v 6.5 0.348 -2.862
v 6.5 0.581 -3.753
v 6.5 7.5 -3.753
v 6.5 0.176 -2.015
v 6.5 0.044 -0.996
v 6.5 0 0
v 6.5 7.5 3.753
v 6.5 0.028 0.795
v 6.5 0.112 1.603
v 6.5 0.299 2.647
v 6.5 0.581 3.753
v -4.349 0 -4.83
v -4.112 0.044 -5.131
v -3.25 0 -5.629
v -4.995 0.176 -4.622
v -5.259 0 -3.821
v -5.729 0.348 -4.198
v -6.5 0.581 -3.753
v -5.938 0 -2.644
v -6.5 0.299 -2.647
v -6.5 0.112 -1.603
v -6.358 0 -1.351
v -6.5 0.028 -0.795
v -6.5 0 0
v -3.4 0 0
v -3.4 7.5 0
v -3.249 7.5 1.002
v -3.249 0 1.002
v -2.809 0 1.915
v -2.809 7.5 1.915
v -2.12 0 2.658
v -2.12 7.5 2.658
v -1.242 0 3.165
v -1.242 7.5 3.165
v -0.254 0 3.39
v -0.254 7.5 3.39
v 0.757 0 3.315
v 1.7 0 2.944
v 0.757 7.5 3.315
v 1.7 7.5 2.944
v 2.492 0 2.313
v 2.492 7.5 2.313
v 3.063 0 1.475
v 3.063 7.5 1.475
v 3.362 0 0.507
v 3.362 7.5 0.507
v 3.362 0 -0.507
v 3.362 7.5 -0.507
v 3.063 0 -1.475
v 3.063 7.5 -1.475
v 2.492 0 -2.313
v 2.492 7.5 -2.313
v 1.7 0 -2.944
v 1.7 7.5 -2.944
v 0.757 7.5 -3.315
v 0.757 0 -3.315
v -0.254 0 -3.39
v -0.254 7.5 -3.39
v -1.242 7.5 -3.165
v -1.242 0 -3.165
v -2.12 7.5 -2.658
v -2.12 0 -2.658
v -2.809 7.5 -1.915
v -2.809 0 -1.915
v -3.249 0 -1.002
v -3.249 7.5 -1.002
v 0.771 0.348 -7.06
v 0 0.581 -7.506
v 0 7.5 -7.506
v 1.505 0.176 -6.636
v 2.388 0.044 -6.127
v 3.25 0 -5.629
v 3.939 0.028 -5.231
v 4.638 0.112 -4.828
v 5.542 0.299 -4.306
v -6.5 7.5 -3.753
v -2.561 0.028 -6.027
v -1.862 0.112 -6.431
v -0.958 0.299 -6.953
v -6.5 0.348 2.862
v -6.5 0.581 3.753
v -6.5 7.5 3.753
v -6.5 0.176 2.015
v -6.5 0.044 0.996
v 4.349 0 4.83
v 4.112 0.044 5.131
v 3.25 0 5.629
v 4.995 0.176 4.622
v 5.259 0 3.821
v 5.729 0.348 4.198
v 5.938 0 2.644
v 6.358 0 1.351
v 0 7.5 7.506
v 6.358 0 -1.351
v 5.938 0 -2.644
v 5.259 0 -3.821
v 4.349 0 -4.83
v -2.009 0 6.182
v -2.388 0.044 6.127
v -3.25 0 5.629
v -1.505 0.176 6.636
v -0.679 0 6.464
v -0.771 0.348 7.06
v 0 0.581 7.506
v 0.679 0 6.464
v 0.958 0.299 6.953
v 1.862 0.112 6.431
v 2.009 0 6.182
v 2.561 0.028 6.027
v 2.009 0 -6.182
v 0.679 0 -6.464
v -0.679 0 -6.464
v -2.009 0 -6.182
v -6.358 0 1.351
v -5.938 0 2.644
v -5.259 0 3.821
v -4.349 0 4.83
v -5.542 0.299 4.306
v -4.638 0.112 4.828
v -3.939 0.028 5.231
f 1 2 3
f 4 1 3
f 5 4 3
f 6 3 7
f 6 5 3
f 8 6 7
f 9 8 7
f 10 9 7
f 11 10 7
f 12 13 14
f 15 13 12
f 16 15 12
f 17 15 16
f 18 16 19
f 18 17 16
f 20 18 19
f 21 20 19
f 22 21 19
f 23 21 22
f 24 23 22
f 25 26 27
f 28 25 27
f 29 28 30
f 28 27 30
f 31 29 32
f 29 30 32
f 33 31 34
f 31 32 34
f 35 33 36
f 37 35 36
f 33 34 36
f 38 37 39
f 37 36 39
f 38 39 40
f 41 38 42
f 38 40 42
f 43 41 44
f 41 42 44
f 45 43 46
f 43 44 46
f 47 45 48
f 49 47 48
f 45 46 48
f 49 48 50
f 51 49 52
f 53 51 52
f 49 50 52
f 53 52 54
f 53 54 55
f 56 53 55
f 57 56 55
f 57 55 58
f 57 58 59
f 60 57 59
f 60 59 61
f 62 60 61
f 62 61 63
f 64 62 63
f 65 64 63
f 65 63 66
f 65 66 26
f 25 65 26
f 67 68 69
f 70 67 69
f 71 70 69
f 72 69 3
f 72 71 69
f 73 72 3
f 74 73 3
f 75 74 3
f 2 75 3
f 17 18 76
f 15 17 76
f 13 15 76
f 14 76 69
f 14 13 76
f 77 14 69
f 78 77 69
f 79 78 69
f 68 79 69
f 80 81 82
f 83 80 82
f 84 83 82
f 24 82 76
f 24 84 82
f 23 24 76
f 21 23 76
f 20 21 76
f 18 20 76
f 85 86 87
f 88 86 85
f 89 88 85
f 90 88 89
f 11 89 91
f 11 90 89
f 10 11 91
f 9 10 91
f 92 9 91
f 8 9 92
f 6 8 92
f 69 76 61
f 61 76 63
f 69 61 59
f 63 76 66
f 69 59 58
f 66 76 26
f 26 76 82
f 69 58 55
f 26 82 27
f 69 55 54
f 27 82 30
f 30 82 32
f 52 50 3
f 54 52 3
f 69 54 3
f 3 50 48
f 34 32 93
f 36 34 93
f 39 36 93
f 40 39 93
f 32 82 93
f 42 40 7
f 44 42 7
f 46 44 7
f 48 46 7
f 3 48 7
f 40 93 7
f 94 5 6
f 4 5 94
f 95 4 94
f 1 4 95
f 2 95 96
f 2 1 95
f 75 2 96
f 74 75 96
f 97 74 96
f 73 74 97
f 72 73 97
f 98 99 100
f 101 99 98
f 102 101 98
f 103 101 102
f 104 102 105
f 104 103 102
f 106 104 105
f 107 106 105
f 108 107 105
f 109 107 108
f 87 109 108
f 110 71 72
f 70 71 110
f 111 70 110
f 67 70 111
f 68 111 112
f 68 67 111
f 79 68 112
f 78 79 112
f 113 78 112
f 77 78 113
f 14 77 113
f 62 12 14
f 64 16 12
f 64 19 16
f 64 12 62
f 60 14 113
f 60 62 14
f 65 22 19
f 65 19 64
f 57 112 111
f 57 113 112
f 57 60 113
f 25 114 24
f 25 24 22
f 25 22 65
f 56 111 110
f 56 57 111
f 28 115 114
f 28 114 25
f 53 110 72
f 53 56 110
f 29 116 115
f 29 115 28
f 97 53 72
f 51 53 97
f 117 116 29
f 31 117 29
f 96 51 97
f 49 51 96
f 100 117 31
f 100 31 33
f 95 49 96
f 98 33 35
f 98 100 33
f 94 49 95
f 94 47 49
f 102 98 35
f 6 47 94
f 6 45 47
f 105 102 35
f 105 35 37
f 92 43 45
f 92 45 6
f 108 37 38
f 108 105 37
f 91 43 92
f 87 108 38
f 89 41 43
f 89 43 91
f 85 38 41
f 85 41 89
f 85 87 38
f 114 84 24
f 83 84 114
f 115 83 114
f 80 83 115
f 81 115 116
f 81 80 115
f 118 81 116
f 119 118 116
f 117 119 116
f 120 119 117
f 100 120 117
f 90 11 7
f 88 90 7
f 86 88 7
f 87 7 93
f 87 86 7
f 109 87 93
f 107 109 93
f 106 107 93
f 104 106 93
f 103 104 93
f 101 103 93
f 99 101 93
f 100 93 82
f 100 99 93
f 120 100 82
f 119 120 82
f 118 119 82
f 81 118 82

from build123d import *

# Parameters (mm, degrees)
F1_DEPTH = 7.5
F5_D     = 6.8


with BuildPart() as f1:
    # F0 (on Front) → F1 (new body)
    with BuildSketch(Plane.XZ):
        Polygon((6.5, -3.7527767497), (6.5, 3.7527767497), (0, 7.5055534995), (-6.5, 3.7527767497), (-6.5, -3.7527767497), (0, -7.5055534995), align=None)
    extrude(amount=-F1_DEPTH)

    # F2 (on Right) → F3 (revolve, cut)
    with BuildSketch(Plane.YZ):
        Polygon((0, 11.5055534995), (0, 6.5), (2.8899576604, 11.5055534995), align=None)
    revolve(axis=Axis((0, 2.7997596189, 0), (0, 1, 0)), mode=Mode.SUBTRACT)

    # F5 (through all)
    with Locations(Plane.XZ):
        with Locations((0, 0)):
            Hole(F5_D / 2)


solid = f1.part
